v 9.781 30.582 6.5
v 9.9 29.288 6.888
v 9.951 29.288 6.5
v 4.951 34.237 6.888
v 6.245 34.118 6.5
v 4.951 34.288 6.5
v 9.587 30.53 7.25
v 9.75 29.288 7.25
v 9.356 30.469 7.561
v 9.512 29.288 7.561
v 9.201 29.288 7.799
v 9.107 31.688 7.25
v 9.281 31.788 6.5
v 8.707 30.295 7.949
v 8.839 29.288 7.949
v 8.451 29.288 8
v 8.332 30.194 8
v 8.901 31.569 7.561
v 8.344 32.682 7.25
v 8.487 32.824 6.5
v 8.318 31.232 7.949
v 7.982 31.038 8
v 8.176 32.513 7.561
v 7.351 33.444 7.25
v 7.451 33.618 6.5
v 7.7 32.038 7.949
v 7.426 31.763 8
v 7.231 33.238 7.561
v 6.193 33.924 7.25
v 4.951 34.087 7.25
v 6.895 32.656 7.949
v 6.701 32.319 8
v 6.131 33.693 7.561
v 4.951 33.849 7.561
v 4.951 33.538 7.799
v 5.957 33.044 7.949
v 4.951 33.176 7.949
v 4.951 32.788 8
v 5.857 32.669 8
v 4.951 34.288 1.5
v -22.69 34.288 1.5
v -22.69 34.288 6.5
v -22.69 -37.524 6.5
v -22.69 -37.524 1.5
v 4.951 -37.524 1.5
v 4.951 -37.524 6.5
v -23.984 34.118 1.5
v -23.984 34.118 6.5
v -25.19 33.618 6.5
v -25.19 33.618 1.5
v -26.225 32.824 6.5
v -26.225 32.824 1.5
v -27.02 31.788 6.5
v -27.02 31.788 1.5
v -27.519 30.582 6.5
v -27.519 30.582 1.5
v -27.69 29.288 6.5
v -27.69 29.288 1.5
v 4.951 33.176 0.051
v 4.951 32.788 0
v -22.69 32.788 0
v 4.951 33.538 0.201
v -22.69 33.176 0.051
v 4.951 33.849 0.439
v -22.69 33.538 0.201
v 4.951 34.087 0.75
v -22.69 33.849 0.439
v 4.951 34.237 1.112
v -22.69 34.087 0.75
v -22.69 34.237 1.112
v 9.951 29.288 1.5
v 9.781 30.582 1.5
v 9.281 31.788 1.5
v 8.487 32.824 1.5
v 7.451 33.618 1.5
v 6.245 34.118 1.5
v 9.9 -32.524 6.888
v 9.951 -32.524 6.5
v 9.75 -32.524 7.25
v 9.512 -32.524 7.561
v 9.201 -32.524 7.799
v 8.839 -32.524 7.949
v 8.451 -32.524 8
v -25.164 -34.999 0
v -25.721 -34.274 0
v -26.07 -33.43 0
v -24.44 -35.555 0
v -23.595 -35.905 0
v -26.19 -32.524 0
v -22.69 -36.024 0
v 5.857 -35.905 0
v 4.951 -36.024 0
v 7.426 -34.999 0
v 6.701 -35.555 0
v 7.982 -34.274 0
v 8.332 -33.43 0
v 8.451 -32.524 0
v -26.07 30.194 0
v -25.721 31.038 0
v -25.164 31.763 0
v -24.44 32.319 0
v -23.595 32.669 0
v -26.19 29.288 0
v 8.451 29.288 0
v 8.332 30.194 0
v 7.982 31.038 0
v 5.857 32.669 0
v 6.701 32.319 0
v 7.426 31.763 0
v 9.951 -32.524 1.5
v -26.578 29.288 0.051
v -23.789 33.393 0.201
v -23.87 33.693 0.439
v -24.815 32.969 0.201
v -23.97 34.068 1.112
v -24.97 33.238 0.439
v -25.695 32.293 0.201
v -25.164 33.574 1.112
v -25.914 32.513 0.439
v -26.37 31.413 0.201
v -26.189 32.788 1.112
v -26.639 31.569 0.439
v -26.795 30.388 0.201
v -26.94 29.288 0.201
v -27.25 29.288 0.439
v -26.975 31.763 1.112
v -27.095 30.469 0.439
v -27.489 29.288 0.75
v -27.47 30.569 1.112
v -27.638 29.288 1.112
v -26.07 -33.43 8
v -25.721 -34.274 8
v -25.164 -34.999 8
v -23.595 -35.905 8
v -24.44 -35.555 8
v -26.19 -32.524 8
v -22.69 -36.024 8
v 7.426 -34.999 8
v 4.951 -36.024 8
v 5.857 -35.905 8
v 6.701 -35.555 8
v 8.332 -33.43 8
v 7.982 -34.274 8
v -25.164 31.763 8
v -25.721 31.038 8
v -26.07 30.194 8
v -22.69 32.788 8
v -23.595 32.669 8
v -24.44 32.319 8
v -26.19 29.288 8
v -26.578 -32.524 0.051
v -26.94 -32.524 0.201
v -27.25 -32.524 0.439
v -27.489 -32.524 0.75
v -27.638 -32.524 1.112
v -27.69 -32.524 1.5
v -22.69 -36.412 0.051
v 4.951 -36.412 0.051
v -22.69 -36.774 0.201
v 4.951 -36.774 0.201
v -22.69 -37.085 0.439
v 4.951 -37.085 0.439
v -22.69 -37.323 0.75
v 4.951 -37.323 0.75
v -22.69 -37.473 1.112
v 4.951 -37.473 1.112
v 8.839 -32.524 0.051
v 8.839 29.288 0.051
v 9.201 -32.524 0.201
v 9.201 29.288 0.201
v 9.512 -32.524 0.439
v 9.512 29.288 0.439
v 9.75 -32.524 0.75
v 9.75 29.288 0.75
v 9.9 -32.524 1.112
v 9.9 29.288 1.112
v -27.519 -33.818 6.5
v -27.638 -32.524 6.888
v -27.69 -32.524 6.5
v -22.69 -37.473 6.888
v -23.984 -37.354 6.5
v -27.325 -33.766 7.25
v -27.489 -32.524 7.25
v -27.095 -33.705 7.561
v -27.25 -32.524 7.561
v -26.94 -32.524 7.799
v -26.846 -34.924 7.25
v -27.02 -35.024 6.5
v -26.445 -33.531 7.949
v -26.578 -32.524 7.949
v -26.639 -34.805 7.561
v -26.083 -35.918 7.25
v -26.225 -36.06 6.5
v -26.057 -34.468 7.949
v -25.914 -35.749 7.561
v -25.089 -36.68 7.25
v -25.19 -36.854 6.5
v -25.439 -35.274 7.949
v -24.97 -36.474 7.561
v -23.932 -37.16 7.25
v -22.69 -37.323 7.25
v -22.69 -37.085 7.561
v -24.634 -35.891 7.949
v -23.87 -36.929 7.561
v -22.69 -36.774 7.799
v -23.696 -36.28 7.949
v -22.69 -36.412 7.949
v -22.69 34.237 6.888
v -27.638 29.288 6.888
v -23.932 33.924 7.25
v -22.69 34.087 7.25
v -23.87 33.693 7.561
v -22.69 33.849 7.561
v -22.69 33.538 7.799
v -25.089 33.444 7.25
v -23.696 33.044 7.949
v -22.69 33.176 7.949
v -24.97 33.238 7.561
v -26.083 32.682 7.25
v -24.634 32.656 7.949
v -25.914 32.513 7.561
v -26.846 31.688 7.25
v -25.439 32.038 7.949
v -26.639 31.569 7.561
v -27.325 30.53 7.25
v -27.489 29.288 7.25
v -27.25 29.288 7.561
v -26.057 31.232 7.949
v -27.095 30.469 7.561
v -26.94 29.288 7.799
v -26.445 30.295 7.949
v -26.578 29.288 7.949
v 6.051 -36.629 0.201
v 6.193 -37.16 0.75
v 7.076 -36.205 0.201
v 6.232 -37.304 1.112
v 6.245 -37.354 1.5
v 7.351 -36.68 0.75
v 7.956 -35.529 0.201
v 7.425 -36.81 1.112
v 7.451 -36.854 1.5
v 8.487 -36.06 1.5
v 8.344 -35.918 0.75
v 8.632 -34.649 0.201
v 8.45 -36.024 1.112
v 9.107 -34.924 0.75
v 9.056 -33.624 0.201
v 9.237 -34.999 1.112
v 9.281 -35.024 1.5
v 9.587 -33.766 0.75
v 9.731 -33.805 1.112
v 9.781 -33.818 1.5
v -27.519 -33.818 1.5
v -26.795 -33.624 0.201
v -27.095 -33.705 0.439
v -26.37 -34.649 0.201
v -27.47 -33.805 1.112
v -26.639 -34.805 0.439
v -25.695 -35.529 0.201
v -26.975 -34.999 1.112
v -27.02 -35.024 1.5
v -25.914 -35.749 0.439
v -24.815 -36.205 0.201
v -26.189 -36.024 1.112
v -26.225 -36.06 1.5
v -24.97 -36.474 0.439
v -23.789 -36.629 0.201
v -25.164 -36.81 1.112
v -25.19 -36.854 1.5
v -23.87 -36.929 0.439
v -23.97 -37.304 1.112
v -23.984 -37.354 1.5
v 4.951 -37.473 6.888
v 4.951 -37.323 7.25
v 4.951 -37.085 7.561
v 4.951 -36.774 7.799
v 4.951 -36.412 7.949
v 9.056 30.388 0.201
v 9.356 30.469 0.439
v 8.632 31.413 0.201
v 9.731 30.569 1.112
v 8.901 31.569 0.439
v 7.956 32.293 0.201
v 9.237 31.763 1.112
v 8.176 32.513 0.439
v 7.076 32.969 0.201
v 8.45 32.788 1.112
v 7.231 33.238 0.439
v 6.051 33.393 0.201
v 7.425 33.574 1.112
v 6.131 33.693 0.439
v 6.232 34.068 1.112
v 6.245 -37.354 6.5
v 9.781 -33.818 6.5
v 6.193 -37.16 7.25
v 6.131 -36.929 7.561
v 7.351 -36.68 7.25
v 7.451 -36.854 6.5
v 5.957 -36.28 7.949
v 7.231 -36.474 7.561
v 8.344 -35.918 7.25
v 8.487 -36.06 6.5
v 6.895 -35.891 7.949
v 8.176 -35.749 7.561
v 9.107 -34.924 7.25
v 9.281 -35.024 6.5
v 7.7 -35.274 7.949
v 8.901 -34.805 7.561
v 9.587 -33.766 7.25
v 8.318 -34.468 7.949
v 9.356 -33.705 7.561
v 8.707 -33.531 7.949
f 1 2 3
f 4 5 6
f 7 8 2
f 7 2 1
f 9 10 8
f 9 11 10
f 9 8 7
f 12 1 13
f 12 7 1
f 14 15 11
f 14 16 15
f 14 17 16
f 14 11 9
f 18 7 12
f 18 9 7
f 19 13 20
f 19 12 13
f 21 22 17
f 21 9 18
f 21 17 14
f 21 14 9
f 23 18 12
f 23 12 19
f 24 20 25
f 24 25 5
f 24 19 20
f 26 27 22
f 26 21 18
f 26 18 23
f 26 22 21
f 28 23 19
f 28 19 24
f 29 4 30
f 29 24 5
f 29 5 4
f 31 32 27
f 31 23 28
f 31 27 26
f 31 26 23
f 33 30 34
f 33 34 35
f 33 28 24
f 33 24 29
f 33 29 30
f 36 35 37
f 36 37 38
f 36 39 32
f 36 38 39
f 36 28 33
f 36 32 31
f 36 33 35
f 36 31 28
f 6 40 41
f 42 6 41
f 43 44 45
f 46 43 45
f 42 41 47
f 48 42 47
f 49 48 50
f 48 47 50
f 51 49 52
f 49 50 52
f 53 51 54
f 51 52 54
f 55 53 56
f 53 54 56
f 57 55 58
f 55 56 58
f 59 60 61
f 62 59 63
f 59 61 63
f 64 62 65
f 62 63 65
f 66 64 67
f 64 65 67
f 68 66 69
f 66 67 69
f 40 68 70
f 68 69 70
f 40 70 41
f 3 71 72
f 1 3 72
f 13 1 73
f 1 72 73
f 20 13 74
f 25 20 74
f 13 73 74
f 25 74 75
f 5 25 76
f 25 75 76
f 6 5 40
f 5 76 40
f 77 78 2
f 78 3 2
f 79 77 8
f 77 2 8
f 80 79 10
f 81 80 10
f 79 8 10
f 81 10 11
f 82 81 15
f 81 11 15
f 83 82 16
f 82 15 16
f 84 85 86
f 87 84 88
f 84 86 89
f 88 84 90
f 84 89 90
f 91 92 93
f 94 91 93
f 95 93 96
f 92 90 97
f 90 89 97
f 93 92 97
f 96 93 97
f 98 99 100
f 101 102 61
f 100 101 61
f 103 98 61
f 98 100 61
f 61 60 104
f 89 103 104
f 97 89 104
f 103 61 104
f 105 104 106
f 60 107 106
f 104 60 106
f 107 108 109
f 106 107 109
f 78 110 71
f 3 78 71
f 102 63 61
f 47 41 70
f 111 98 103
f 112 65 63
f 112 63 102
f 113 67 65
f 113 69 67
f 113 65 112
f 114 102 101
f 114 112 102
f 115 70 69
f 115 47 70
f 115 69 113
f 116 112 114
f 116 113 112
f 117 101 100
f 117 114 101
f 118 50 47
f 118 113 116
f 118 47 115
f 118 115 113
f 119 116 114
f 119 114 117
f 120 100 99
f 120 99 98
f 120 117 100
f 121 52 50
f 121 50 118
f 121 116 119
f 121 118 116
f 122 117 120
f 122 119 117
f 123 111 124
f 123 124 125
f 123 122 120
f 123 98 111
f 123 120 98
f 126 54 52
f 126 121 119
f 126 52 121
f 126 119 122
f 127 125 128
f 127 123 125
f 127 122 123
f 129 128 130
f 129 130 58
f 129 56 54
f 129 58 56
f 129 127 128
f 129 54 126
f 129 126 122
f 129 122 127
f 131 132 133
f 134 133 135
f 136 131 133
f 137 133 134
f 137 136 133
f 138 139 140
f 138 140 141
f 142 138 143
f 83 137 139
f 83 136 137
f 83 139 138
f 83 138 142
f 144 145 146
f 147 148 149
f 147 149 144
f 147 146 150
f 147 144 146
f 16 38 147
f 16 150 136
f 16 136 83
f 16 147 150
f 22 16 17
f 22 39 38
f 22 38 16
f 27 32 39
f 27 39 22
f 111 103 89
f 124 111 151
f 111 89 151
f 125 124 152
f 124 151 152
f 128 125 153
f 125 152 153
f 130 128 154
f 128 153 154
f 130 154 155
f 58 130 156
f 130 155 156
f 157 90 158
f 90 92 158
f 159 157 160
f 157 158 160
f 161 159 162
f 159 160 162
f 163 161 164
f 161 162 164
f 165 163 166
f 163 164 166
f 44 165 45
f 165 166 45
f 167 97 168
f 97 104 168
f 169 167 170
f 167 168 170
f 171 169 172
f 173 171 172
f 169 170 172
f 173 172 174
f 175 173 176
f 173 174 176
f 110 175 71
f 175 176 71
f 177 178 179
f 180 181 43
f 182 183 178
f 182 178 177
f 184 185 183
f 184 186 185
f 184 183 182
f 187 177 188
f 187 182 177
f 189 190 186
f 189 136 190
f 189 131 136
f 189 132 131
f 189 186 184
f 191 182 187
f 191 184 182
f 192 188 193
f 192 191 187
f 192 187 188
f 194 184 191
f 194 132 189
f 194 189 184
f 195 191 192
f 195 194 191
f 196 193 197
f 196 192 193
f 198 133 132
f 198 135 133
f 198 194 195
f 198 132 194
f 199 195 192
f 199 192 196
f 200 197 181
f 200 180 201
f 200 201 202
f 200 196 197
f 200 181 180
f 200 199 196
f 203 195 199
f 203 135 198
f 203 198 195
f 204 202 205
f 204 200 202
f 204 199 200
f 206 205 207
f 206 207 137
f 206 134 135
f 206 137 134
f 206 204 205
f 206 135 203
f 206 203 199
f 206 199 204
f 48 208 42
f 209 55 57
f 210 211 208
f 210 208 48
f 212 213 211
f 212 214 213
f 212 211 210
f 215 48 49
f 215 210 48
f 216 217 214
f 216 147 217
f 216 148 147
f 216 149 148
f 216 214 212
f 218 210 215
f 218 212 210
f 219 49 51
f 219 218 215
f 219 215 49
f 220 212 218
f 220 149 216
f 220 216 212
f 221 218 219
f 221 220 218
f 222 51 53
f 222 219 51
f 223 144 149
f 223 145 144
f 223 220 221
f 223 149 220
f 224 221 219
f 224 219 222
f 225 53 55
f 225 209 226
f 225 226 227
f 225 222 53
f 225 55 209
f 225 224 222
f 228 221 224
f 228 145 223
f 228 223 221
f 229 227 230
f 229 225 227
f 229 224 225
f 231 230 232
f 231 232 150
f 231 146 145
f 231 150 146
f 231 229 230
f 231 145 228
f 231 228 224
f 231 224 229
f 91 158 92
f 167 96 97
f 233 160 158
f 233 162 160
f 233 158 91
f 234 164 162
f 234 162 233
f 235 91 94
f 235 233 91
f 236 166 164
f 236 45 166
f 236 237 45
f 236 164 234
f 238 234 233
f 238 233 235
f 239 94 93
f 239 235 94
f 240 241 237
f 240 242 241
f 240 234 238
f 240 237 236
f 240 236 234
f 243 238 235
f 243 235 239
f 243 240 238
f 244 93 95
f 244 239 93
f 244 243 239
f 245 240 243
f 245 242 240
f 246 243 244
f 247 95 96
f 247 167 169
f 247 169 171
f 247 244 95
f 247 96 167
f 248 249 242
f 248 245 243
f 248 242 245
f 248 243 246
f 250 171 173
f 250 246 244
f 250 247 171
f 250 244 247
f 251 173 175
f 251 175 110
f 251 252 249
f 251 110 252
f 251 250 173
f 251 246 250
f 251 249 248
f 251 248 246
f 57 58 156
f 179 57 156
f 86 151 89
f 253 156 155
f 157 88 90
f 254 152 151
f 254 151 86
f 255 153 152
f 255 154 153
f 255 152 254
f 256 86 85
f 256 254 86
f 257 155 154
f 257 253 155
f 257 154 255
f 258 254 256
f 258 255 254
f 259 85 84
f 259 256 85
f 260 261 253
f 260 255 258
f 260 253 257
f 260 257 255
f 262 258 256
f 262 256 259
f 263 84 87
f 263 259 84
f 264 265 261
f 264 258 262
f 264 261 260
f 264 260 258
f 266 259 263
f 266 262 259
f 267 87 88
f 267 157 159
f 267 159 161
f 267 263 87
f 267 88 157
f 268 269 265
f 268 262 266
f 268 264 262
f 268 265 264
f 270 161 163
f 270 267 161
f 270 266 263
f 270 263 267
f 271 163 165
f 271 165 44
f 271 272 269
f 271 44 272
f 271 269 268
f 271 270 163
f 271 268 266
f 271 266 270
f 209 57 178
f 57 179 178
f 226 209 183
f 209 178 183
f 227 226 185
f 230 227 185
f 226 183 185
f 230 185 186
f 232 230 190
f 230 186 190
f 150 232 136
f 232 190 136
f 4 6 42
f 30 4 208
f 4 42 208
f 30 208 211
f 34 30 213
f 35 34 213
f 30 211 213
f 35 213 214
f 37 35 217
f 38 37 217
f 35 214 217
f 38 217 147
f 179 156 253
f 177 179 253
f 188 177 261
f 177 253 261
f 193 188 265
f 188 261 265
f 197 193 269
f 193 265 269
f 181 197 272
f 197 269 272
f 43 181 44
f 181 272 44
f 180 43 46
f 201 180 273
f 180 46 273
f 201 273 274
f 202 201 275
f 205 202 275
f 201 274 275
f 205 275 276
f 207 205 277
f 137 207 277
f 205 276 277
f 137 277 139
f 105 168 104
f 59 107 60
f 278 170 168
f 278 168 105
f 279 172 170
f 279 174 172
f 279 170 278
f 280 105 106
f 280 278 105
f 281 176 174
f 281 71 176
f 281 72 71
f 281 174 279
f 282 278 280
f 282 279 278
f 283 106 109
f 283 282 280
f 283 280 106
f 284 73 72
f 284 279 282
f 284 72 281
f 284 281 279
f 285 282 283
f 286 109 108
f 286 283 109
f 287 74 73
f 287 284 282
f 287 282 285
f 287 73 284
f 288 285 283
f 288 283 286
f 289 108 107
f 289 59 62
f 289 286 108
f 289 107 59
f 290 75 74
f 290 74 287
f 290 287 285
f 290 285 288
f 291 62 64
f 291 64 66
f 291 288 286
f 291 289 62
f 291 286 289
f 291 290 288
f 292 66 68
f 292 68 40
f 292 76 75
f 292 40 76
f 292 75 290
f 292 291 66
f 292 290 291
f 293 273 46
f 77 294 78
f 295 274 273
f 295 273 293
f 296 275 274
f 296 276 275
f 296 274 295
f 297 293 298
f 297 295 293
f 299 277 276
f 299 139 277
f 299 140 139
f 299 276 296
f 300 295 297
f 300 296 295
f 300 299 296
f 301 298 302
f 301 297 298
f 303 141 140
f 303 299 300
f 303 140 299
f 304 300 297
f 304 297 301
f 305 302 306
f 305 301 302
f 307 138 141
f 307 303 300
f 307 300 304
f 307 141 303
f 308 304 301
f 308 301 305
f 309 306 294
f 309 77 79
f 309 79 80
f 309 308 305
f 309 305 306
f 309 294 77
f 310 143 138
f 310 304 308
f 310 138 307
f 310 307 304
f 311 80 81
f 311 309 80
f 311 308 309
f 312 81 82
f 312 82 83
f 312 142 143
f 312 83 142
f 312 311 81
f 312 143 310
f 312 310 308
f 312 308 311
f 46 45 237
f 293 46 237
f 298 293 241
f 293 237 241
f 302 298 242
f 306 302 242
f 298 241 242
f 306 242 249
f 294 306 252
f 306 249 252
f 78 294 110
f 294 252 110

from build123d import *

# Parameters (mm, degrees)
F1_DEPTH = 8
F2_R     = 1.5
F3_R     = 1.5


with BuildPart() as f1:
    # F0 (on Top) → F1 (new body)
    with BuildSketch(Plane.XY):
        with BuildLine():
            Line((4.951009, 34.288198), (-22.689517, 34.288198))
            ThreePointArc((-22.689517, 34.288198), (-26.22505, 32.823732), (-27.689517, 29.288198))
            Line((-27.689517, 29.288198), (-27.689517, -32.524177))
            ThreePointArc((-27.689517, -32.524177), (-26.22505, -36.059711), (-22.689517, -37.524177))
            Line((-22.689517, -37.524177), (4.951009, -37.524177))
            ThreePointArc((4.951009, -37.524177), (8.486543, -36.059711), (9.951009, -32.524177))
            Line((9.951009, -32.524177), (9.951009, 29.288198))
            ThreePointArc((9.951009, 29.288198), (8.486543, 32.823732), (4.951009, 34.288198))
        make_face()
    extrude(amount=F1_DEPTH)

    # F2
    f2_edges = [f1.edges().sort_by_distance(p)[0] for p in [
        (9.951009, -1.617989, 8),
        (8.486543, 32.823732, 8),
        (-8.869254, 34.288198, 8),
        (-26.22505, 32.823732, 8),
        (-27.689517, -1.617989, 8),
        (-26.22505, -36.059711, 8),
        (-8.869254, -37.524177, 8),
        (8.486543, -36.059711, 8),
    ]]
    fillet(f2_edges, radius=F2_R)

    # F3
    f3_edges = [f1.edges().sort_by_distance(p)[0] for p in [
        (9.951009, -1.617989, 0),
        (8.486543, 32.823732, 0),
        (-8.869254, 34.288198, 0),
        (-26.22505, 32.823732, 0),
        (-27.689517, -1.617989, 0),
        (-26.22505, -36.059711, 0),
        (-8.869254, -37.524177, 0),
        (8.486543, -36.059711, 0),
    ]]
    fillet(f3_edges, radius=F3_R)


solid = f1.part
